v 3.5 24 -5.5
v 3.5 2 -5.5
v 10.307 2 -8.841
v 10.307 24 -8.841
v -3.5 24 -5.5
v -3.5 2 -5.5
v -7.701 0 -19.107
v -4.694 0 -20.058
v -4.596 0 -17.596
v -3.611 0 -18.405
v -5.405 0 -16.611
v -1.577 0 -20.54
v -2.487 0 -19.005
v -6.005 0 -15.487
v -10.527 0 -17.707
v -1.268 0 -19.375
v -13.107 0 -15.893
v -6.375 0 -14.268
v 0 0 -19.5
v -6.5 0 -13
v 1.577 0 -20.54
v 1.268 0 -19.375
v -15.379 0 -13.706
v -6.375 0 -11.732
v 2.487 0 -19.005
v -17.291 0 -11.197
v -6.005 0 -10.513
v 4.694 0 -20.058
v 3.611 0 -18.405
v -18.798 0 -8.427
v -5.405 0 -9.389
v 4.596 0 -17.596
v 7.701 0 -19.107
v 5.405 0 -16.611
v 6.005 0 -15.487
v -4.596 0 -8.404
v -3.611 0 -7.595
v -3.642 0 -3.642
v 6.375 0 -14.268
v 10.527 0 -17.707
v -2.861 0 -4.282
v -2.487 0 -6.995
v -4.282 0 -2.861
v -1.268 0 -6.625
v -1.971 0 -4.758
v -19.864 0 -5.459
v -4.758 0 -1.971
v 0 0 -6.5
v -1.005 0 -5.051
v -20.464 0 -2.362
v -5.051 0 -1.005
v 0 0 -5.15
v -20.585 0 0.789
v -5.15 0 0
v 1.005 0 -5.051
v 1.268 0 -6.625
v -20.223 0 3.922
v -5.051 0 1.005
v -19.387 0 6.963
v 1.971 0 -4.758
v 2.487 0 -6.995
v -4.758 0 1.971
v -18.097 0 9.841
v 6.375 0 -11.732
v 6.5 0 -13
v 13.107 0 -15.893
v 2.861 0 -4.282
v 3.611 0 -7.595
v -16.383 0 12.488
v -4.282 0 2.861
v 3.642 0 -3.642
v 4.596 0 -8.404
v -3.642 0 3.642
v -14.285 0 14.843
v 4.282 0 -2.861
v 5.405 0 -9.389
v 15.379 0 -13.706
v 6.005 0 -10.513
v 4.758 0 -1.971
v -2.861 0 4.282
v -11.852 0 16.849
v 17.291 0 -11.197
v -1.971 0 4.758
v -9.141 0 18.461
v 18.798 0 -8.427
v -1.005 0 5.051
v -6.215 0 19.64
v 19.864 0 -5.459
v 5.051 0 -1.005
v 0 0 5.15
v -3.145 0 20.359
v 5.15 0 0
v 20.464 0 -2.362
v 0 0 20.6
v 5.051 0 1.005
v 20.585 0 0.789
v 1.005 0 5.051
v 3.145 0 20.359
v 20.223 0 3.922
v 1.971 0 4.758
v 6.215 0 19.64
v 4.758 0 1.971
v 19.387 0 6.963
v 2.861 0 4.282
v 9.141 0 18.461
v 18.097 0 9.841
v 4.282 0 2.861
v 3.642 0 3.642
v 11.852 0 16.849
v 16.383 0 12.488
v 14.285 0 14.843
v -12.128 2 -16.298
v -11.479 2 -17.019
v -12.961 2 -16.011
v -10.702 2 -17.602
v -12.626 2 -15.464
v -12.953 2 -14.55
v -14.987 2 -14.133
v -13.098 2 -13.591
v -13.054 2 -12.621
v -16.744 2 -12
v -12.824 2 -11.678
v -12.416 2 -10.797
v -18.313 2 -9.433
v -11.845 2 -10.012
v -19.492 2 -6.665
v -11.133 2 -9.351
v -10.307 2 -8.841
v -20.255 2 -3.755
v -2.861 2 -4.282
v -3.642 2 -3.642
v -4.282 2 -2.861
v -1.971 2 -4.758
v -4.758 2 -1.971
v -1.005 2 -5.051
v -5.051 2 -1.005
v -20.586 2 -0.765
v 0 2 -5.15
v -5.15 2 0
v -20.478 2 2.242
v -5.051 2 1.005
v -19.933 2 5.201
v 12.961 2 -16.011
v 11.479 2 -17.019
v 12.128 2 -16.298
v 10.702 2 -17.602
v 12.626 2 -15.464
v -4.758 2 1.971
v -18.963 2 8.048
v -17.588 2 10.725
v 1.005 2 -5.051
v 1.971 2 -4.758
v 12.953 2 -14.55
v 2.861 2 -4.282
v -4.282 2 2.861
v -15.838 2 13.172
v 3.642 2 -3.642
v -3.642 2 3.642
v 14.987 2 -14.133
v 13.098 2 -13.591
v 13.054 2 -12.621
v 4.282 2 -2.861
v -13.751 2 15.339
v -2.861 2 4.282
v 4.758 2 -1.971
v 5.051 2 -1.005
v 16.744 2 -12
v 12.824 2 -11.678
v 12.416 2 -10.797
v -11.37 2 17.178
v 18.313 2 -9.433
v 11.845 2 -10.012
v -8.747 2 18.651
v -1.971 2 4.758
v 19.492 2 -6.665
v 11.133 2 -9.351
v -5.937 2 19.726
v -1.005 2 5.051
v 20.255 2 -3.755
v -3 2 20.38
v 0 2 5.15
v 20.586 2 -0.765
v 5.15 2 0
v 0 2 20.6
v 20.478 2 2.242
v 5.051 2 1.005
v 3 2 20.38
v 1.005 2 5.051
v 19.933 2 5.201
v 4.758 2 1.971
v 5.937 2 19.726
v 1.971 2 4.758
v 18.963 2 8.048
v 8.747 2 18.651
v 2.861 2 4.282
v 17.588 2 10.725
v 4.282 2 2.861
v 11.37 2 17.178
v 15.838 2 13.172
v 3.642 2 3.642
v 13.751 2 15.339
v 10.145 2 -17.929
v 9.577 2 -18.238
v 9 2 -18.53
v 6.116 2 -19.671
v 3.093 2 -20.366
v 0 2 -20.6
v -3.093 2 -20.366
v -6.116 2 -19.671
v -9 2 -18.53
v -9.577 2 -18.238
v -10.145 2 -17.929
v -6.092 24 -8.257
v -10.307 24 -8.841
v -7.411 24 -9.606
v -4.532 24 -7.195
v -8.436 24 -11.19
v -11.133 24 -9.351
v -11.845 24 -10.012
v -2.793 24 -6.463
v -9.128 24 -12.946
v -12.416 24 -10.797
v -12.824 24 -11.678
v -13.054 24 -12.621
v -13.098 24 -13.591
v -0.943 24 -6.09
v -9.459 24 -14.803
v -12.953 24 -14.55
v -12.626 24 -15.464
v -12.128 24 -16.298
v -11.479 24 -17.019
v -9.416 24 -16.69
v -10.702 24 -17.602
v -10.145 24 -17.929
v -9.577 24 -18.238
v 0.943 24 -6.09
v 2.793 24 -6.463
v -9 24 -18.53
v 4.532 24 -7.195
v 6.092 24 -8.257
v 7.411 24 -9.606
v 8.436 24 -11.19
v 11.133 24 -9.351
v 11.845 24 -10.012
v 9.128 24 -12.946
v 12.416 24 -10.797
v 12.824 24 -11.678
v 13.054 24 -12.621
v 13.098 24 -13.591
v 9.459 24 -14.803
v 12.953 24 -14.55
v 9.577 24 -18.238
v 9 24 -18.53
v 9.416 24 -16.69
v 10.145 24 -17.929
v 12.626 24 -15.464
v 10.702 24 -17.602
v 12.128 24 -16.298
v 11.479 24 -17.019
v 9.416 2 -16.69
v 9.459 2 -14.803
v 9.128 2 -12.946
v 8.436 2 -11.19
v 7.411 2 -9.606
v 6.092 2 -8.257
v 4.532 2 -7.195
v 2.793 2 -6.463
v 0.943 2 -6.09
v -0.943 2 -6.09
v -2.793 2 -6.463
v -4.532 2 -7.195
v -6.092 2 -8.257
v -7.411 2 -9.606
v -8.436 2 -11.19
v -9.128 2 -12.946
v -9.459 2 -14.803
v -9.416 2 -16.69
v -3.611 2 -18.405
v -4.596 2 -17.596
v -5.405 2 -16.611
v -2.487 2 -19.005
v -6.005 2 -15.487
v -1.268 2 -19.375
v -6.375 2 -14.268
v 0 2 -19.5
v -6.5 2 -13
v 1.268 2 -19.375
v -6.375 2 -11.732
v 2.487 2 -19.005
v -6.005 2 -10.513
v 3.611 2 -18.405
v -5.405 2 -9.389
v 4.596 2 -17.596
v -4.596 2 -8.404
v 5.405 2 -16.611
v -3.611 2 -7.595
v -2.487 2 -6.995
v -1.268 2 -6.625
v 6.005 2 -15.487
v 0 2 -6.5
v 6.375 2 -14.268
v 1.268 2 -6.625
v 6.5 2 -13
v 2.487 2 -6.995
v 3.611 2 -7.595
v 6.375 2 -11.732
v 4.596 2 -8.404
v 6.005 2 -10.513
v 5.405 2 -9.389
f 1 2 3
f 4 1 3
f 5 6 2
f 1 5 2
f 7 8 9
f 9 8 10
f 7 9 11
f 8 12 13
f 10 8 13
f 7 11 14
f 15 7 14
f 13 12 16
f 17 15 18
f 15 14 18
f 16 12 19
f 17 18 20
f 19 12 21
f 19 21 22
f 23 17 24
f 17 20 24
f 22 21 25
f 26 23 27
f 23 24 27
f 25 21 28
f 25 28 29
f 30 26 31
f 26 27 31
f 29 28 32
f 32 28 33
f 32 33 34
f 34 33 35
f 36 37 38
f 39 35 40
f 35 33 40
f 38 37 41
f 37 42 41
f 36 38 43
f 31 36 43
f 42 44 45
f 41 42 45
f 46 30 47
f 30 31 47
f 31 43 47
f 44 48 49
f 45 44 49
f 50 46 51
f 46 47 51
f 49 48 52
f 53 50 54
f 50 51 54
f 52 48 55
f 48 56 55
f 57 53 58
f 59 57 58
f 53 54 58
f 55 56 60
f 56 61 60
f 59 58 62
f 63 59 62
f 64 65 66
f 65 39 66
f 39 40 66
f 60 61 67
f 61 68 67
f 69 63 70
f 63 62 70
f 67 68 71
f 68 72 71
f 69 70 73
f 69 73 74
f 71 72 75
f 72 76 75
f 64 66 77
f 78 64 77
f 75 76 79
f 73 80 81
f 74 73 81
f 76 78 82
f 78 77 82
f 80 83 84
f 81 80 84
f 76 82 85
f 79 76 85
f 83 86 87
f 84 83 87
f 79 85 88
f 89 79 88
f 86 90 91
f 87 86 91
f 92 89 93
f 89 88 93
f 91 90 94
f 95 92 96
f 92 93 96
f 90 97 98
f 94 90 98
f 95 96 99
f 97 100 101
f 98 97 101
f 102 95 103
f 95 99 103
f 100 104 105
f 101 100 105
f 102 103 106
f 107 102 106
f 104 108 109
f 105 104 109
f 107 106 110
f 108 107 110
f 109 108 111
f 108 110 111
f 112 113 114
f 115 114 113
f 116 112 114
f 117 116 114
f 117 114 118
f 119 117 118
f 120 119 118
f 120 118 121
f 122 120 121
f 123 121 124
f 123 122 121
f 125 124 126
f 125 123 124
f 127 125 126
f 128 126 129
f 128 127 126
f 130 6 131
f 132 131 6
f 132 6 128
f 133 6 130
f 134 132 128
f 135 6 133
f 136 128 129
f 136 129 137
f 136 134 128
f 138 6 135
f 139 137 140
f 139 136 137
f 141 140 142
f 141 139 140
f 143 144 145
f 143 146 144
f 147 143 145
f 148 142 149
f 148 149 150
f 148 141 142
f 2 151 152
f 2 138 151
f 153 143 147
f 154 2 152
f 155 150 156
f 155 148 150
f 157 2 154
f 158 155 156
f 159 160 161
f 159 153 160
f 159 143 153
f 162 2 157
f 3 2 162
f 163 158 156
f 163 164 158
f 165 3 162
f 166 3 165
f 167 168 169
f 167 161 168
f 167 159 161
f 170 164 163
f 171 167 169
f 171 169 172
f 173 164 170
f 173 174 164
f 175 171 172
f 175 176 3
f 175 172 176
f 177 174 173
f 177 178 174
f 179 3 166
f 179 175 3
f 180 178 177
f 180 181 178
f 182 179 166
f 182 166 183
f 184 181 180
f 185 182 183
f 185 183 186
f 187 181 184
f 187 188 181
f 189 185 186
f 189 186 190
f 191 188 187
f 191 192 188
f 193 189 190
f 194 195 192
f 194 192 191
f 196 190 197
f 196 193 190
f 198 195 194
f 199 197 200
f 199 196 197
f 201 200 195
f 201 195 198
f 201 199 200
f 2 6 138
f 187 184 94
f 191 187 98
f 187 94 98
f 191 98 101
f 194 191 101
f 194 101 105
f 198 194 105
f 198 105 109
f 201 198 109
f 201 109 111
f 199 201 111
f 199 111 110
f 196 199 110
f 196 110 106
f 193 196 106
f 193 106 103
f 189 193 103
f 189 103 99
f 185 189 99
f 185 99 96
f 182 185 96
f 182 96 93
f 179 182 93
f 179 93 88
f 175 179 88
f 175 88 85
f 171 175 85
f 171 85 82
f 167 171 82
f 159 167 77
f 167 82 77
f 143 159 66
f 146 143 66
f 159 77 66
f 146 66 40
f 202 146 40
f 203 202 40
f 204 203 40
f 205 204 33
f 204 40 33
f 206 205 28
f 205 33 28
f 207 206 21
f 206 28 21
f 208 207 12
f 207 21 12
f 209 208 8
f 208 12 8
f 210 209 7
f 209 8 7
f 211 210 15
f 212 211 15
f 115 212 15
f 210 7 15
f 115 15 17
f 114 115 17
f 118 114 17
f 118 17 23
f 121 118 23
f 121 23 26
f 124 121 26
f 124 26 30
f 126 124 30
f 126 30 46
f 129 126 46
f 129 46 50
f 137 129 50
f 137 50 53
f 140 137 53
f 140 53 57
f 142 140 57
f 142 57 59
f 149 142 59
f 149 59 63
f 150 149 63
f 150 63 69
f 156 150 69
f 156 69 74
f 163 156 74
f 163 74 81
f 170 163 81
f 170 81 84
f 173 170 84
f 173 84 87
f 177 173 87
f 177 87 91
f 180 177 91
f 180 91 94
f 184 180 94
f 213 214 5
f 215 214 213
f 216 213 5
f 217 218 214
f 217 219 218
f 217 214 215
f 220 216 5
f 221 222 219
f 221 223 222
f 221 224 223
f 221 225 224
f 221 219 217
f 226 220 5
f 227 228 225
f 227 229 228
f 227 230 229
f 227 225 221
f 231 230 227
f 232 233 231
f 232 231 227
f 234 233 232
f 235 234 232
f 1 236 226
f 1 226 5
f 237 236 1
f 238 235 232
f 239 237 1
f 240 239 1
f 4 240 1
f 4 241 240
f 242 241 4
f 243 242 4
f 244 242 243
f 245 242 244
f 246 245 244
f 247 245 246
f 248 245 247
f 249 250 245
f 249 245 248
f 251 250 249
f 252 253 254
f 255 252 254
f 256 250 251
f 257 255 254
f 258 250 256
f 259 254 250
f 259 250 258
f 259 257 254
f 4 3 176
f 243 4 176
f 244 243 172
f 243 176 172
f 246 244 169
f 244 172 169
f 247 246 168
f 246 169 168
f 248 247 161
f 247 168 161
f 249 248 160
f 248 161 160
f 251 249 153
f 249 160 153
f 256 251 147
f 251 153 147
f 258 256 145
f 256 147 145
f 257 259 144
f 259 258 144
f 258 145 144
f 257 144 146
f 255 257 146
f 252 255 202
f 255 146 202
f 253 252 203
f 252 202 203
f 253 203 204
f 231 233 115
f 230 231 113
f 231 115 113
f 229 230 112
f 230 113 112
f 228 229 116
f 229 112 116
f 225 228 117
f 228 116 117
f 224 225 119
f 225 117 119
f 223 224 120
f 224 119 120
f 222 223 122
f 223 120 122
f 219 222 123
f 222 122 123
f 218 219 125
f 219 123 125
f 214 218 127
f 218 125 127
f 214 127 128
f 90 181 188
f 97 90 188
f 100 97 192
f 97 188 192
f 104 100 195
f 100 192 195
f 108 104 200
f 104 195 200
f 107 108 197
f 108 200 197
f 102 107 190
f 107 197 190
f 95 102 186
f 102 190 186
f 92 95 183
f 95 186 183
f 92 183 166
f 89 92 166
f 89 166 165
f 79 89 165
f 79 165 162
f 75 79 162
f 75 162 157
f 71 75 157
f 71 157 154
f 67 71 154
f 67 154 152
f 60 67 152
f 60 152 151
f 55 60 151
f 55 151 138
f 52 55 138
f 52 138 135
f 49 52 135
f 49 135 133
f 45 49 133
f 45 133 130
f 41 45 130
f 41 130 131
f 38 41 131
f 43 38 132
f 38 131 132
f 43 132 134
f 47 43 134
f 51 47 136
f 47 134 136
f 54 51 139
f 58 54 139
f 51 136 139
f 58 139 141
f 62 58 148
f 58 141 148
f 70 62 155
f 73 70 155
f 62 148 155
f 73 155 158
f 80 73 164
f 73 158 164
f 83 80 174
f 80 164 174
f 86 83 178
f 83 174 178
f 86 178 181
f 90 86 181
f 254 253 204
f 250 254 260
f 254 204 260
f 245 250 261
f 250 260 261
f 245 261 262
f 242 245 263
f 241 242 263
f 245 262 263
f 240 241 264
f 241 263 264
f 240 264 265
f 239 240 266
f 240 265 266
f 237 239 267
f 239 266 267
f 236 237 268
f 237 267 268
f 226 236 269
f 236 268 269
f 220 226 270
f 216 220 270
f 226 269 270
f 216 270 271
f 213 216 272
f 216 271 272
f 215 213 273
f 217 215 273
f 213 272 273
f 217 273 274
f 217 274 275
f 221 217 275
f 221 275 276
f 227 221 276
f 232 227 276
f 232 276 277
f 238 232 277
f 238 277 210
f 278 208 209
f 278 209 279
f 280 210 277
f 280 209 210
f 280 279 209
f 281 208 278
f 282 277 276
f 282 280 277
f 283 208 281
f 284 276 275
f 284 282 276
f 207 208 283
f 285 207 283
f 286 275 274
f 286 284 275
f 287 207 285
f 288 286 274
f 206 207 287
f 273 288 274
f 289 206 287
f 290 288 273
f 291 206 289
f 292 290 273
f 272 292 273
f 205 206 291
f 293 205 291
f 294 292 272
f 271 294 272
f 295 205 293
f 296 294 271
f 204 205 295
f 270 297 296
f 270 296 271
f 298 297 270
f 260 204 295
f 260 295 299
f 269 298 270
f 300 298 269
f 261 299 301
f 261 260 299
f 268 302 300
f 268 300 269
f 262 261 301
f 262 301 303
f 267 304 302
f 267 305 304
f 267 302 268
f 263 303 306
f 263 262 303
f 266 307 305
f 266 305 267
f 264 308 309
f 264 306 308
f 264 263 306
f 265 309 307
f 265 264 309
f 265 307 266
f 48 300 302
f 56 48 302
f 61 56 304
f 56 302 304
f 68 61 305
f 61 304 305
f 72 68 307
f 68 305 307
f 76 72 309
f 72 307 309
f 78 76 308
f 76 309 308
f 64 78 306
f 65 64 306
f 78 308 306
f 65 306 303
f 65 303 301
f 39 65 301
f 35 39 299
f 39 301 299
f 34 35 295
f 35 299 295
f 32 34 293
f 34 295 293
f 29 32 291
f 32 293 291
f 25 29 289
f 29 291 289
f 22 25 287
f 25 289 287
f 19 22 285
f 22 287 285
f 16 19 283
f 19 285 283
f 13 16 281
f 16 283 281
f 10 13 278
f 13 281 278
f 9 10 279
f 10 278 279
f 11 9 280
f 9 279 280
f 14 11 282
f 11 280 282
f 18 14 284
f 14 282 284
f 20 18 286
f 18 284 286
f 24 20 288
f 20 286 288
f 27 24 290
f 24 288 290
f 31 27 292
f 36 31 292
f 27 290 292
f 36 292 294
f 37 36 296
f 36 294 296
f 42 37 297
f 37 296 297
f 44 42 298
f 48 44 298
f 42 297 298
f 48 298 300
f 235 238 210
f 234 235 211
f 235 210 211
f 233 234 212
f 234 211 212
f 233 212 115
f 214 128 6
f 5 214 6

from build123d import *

# Parameters (mm, degrees)
SKETCH1_R           = 20.600000000000005
BOSS_EXTRUDE1_DEPTH = 2
SKETCH2_R           = 5.150000000000001
CUT_EXTRUDE1_DEPTH  = 3
SKETCH3_R           = 6.500000000000001
CUT_EXTRUDE2_DEPTH  = 2
BOSS_EXTRUDE4_DEPTH = 22
FILLET2_R           = 5


with BuildPart() as part:
    # Sketch1 → Boss-Extrude1 (new body)
    with BuildSketch(Plane(origin=(0, 0, 0), x_dir=(1, 0, 0), z_dir=(0, 1, 0))):
        Circle(SKETCH1_R)
    extrude(amount=BOSS_EXTRUDE1_DEPTH)

    # Sketch2 → Cut-Extrude1 (cut)
    with BuildSketch(Plane(origin=(0, 2, 0), x_dir=(1, 0, 0), z_dir=(0, 1, 0))):
        Circle(SKETCH2_R)
    extrude(amount=-CUT_EXTRUDE1_DEPTH, mode=Mode.SUBTRACT)

    # Sketch3 → Cut-Extrude2 (cut)
    with BuildSketch(Plane(origin=(0, 2, 0), x_dir=(1, 0, 0), z_dir=(0, 1, 0))):
        with Locations((0, 13)):
            Circle(SKETCH3_R)
    extrude(amount=-CUT_EXTRUDE2_DEPTH, mode=Mode.SUBTRACT)

    # Sketch4 → Boss-Extrude4 (add)
    with BuildSketch(Plane(origin=(0, 2, 0), x_dir=(1, 0, 0), z_dir=(0, 1, 0))):
        with BuildLine():
            Line((-16.74395413276088, 12), (-3.5000000000000004, 5.5))
            Line((-3.5000000000000004, 5.5), (3.4999999999999996, 5.5))
            Line((3.4999999999999996, 5.5), (16.74395413276088, 12))
            ThreePointArc((16.743954132760877, 12.000000000000005), (13.279606142773188, 15.748398670748102), (9, 18.529975715040756))
            ThreePointArc((9, 18.529975715040756), (-4.4e-16, 6.042759078514694), (-9, 18.529975715040756))
            ThreePointArc((-9.000000000000004, 18.529975715040756), (-13.279606142773194, 15.748398670748106), (-16.74395413276088, 12))
        make_face()
    extrude(amount=BOSS_EXTRUDE4_DEPTH)

    # Fillet2
    fillet2_edges = [part.edges().sort_by_distance(p)[0] for p in [
        (16.74395413276088, 13, -12.000000000000004),
        (-16.743954132760884, 13, -12),
    ]]
    fillet(fillet2_edges, radius=FILLET2_R)


solid = part.part
